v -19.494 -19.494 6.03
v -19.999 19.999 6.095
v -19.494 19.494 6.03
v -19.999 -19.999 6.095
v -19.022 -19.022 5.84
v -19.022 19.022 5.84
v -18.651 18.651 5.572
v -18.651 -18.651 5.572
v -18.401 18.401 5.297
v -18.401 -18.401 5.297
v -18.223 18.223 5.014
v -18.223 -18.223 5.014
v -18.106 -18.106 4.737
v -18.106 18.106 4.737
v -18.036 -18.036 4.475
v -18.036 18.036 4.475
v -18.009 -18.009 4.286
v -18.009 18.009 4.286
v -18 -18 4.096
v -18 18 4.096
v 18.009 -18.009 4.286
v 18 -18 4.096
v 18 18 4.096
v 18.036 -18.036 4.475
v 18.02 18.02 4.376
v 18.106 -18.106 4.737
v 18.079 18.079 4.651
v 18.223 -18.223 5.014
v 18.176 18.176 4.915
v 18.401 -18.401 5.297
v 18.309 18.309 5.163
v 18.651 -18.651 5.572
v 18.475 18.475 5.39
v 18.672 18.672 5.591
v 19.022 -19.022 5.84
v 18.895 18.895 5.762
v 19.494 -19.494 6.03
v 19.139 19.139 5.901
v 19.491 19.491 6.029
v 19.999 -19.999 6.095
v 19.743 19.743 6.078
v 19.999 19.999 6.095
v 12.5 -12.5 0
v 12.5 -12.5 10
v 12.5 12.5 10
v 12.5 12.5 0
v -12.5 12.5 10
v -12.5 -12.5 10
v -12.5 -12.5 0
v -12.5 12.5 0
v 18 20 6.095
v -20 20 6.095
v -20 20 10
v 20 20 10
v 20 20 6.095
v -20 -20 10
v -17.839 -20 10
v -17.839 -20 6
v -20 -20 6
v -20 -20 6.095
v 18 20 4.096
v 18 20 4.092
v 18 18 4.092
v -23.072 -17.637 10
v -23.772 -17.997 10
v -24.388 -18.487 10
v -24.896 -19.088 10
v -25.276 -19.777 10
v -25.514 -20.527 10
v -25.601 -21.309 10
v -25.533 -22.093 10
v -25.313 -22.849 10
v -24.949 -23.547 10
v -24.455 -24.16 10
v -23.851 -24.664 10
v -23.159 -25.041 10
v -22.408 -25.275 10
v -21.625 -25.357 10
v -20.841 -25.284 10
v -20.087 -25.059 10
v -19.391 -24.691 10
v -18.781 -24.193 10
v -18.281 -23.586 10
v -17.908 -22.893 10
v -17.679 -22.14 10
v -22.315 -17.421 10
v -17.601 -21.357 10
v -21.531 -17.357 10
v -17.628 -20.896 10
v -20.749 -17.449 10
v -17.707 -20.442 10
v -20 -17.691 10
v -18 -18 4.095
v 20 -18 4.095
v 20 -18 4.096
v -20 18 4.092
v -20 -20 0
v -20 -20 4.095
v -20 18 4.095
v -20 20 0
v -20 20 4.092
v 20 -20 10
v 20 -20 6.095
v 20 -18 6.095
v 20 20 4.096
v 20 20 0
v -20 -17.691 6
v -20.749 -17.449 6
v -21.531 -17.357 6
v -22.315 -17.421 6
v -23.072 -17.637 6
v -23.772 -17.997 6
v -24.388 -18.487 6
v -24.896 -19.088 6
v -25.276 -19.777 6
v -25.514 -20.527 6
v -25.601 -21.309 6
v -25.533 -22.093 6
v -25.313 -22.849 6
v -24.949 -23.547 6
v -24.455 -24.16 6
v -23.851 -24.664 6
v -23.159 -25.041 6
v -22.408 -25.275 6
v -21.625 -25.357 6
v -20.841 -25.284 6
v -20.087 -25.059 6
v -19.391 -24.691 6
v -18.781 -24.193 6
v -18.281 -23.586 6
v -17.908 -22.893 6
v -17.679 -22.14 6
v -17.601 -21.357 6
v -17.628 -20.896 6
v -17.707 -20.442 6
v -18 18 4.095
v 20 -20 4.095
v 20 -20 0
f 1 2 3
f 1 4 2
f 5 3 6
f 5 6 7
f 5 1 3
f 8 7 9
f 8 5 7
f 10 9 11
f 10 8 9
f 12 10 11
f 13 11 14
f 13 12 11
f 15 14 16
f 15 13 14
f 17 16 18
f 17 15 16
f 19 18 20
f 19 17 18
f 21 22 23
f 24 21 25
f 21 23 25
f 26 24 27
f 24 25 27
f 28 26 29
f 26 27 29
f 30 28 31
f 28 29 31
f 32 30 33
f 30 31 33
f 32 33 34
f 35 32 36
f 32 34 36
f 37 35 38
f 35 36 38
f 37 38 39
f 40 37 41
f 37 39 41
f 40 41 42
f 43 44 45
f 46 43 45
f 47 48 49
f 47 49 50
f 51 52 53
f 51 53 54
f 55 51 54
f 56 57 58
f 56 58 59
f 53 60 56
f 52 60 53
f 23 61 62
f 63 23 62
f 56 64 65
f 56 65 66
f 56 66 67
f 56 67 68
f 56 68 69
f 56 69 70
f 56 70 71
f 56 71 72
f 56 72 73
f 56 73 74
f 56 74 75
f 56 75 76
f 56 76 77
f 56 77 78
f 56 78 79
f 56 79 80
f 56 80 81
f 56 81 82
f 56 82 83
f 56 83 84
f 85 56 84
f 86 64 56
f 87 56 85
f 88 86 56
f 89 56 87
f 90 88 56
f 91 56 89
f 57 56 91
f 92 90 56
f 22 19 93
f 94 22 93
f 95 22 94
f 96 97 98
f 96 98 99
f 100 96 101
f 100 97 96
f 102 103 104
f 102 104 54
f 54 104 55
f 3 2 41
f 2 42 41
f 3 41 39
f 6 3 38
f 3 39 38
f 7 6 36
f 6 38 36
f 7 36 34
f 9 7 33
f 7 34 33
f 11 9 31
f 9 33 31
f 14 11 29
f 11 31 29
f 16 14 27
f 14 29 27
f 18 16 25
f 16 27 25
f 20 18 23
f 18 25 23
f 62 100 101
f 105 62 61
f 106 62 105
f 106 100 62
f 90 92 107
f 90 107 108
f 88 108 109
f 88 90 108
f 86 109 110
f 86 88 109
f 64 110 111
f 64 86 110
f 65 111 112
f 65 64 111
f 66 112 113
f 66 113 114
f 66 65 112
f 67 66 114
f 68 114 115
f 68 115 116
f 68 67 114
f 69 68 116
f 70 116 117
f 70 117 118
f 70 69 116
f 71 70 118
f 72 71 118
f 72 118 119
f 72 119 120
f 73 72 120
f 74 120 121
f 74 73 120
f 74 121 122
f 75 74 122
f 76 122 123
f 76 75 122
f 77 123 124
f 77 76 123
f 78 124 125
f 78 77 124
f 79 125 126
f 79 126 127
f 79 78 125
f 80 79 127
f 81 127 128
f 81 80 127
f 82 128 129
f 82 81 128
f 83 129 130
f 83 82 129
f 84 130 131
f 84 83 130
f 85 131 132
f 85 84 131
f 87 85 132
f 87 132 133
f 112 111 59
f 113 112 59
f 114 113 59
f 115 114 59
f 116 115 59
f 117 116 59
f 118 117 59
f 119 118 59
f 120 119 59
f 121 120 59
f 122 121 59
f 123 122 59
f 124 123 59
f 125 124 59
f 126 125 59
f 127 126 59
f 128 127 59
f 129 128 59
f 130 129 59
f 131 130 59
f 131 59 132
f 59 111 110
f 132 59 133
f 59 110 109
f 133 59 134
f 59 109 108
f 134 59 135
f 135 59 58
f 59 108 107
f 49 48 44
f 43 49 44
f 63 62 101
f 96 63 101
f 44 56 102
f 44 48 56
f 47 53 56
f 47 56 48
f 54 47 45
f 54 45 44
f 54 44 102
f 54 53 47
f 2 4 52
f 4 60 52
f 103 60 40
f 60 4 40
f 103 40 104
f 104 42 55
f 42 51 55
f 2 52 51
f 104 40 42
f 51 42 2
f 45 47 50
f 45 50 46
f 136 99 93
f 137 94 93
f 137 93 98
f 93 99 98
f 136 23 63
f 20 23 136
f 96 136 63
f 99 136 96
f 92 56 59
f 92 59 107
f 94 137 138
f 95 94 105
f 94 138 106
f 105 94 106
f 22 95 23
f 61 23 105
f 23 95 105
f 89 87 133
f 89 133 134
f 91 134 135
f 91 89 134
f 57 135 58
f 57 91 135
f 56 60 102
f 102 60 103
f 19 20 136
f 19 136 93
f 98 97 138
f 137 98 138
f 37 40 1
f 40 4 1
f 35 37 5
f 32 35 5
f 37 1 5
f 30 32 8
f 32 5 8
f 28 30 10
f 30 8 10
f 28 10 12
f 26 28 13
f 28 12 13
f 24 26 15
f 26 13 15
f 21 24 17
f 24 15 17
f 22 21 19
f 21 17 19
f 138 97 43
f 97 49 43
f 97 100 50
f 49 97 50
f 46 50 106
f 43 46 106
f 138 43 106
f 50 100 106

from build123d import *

# Parameters (mm, degrees)
F0_W      = 40
F0_H      = 40
F1_DEPTH  = 10
F2_W      = 25
F2_H      = 25
F3_DEPTH  = 10
F4_W      = 40
F4_H      = 2
F5_DEPTH  = 2
F6_W      = 38
F6_H      = 1.9991408549
F7_DEPTH  = 2
F9_DEPTH  = 2
F10_W     = 36
F10_H     = 2
F11_DEPTH = 2
F12_R     = 1.999
F13_R     = 1.999
F16_DEPTH = 4


with BuildPart() as f1:
    # F0 (on Top) → F1 (new body)
    with BuildSketch(Plane.XY):
        Rectangle(F0_W, F0_H)
    extrude(amount=F1_DEPTH)

    # F2 (on face) → F3 (cut)
    with BuildSketch(Plane.XY.offset(10)):
        Rectangle(F2_W, F2_H)
    extrude(amount=-F3_DEPTH, mode=Mode.SUBTRACT)

    # F4 (on face) → F5 (cut)
    with BuildSketch(Plane.XZ.offset(20)):
        with Locations((0, 5.0947766975)):
            Rectangle(F4_W, F4_H)
    extrude(amount=-F5_DEPTH, mode=Mode.SUBTRACT)

    # F6 (on face) → F7 (cut)
    with BuildSketch(Plane.YZ.offset(20)):
        with Locations((1, 5.09520627)):
            Rectangle(F6_W, F6_H)
    extrude(amount=-F7_DEPTH, mode=Mode.SUBTRACT)

    # F8 (on face) → F9 (cut)
    with BuildSketch(Plane(origin=(0, 20, 0), x_dir=(-1, 0, 0), z_dir=(0, 1, 0))):
        Polygon((20, 6.0947766975), (-18, 6.0947766975), (-18, 4.0956358425), (-18, 4.0922258049), (20, 4.0922258049), align=None)
    extrude(amount=-F9_DEPTH, mode=Mode.SUBTRACT)

    # F10 (on face) → F11 (cut)
    with BuildSketch(Plane(origin=(-20, 0, 0), x_dir=(0, -1, 0), z_dir=(-1, 0, 0))):
        with Locations((0, 5.0947766975)):
            Rectangle(F10_W, F10_H)
    extrude(amount=-F11_DEPTH, mode=Mode.SUBTRACT)

    # F12
    f12_edges = [f1.edges().sort_by_distance(p)[0] for p in [
        (18, 0, 6.094777),
        (0, 18, 6.094777),
    ]]
    fillet(f12_edges, radius=F12_R)

    # F13
    f13_edges = [f1.edges().sort_by_distance(p)[0] for p in [
        (0, -18, 6.094777),
        (-18, 0, 6.094777),
    ]]
    fillet(f13_edges, radius=F13_R)


with BuildPart() as f16:
    # F15 (on face) → F16 (new body)
    with BuildSketch(Plane.XY.offset(10)):
        with BuildLine():
            ThreePointArc((-20, -17.6912108758), (-24.9485205647, -23.5468684721), (-17.6014478566, -21.3566391949))
            ThreePointArc((-17.6014478566, -21.3566391949), (-17.6611648449, -20.6680393198), (-17.8385327506, -20))
            Line((-17.8385327506, -20), (-20, -20))
            Line((-20, -20), (-20, -17.6912108758))
        make_face()
    extrude(amount=-F16_DEPTH)


solid = Compound([f1.part, f16.part])
